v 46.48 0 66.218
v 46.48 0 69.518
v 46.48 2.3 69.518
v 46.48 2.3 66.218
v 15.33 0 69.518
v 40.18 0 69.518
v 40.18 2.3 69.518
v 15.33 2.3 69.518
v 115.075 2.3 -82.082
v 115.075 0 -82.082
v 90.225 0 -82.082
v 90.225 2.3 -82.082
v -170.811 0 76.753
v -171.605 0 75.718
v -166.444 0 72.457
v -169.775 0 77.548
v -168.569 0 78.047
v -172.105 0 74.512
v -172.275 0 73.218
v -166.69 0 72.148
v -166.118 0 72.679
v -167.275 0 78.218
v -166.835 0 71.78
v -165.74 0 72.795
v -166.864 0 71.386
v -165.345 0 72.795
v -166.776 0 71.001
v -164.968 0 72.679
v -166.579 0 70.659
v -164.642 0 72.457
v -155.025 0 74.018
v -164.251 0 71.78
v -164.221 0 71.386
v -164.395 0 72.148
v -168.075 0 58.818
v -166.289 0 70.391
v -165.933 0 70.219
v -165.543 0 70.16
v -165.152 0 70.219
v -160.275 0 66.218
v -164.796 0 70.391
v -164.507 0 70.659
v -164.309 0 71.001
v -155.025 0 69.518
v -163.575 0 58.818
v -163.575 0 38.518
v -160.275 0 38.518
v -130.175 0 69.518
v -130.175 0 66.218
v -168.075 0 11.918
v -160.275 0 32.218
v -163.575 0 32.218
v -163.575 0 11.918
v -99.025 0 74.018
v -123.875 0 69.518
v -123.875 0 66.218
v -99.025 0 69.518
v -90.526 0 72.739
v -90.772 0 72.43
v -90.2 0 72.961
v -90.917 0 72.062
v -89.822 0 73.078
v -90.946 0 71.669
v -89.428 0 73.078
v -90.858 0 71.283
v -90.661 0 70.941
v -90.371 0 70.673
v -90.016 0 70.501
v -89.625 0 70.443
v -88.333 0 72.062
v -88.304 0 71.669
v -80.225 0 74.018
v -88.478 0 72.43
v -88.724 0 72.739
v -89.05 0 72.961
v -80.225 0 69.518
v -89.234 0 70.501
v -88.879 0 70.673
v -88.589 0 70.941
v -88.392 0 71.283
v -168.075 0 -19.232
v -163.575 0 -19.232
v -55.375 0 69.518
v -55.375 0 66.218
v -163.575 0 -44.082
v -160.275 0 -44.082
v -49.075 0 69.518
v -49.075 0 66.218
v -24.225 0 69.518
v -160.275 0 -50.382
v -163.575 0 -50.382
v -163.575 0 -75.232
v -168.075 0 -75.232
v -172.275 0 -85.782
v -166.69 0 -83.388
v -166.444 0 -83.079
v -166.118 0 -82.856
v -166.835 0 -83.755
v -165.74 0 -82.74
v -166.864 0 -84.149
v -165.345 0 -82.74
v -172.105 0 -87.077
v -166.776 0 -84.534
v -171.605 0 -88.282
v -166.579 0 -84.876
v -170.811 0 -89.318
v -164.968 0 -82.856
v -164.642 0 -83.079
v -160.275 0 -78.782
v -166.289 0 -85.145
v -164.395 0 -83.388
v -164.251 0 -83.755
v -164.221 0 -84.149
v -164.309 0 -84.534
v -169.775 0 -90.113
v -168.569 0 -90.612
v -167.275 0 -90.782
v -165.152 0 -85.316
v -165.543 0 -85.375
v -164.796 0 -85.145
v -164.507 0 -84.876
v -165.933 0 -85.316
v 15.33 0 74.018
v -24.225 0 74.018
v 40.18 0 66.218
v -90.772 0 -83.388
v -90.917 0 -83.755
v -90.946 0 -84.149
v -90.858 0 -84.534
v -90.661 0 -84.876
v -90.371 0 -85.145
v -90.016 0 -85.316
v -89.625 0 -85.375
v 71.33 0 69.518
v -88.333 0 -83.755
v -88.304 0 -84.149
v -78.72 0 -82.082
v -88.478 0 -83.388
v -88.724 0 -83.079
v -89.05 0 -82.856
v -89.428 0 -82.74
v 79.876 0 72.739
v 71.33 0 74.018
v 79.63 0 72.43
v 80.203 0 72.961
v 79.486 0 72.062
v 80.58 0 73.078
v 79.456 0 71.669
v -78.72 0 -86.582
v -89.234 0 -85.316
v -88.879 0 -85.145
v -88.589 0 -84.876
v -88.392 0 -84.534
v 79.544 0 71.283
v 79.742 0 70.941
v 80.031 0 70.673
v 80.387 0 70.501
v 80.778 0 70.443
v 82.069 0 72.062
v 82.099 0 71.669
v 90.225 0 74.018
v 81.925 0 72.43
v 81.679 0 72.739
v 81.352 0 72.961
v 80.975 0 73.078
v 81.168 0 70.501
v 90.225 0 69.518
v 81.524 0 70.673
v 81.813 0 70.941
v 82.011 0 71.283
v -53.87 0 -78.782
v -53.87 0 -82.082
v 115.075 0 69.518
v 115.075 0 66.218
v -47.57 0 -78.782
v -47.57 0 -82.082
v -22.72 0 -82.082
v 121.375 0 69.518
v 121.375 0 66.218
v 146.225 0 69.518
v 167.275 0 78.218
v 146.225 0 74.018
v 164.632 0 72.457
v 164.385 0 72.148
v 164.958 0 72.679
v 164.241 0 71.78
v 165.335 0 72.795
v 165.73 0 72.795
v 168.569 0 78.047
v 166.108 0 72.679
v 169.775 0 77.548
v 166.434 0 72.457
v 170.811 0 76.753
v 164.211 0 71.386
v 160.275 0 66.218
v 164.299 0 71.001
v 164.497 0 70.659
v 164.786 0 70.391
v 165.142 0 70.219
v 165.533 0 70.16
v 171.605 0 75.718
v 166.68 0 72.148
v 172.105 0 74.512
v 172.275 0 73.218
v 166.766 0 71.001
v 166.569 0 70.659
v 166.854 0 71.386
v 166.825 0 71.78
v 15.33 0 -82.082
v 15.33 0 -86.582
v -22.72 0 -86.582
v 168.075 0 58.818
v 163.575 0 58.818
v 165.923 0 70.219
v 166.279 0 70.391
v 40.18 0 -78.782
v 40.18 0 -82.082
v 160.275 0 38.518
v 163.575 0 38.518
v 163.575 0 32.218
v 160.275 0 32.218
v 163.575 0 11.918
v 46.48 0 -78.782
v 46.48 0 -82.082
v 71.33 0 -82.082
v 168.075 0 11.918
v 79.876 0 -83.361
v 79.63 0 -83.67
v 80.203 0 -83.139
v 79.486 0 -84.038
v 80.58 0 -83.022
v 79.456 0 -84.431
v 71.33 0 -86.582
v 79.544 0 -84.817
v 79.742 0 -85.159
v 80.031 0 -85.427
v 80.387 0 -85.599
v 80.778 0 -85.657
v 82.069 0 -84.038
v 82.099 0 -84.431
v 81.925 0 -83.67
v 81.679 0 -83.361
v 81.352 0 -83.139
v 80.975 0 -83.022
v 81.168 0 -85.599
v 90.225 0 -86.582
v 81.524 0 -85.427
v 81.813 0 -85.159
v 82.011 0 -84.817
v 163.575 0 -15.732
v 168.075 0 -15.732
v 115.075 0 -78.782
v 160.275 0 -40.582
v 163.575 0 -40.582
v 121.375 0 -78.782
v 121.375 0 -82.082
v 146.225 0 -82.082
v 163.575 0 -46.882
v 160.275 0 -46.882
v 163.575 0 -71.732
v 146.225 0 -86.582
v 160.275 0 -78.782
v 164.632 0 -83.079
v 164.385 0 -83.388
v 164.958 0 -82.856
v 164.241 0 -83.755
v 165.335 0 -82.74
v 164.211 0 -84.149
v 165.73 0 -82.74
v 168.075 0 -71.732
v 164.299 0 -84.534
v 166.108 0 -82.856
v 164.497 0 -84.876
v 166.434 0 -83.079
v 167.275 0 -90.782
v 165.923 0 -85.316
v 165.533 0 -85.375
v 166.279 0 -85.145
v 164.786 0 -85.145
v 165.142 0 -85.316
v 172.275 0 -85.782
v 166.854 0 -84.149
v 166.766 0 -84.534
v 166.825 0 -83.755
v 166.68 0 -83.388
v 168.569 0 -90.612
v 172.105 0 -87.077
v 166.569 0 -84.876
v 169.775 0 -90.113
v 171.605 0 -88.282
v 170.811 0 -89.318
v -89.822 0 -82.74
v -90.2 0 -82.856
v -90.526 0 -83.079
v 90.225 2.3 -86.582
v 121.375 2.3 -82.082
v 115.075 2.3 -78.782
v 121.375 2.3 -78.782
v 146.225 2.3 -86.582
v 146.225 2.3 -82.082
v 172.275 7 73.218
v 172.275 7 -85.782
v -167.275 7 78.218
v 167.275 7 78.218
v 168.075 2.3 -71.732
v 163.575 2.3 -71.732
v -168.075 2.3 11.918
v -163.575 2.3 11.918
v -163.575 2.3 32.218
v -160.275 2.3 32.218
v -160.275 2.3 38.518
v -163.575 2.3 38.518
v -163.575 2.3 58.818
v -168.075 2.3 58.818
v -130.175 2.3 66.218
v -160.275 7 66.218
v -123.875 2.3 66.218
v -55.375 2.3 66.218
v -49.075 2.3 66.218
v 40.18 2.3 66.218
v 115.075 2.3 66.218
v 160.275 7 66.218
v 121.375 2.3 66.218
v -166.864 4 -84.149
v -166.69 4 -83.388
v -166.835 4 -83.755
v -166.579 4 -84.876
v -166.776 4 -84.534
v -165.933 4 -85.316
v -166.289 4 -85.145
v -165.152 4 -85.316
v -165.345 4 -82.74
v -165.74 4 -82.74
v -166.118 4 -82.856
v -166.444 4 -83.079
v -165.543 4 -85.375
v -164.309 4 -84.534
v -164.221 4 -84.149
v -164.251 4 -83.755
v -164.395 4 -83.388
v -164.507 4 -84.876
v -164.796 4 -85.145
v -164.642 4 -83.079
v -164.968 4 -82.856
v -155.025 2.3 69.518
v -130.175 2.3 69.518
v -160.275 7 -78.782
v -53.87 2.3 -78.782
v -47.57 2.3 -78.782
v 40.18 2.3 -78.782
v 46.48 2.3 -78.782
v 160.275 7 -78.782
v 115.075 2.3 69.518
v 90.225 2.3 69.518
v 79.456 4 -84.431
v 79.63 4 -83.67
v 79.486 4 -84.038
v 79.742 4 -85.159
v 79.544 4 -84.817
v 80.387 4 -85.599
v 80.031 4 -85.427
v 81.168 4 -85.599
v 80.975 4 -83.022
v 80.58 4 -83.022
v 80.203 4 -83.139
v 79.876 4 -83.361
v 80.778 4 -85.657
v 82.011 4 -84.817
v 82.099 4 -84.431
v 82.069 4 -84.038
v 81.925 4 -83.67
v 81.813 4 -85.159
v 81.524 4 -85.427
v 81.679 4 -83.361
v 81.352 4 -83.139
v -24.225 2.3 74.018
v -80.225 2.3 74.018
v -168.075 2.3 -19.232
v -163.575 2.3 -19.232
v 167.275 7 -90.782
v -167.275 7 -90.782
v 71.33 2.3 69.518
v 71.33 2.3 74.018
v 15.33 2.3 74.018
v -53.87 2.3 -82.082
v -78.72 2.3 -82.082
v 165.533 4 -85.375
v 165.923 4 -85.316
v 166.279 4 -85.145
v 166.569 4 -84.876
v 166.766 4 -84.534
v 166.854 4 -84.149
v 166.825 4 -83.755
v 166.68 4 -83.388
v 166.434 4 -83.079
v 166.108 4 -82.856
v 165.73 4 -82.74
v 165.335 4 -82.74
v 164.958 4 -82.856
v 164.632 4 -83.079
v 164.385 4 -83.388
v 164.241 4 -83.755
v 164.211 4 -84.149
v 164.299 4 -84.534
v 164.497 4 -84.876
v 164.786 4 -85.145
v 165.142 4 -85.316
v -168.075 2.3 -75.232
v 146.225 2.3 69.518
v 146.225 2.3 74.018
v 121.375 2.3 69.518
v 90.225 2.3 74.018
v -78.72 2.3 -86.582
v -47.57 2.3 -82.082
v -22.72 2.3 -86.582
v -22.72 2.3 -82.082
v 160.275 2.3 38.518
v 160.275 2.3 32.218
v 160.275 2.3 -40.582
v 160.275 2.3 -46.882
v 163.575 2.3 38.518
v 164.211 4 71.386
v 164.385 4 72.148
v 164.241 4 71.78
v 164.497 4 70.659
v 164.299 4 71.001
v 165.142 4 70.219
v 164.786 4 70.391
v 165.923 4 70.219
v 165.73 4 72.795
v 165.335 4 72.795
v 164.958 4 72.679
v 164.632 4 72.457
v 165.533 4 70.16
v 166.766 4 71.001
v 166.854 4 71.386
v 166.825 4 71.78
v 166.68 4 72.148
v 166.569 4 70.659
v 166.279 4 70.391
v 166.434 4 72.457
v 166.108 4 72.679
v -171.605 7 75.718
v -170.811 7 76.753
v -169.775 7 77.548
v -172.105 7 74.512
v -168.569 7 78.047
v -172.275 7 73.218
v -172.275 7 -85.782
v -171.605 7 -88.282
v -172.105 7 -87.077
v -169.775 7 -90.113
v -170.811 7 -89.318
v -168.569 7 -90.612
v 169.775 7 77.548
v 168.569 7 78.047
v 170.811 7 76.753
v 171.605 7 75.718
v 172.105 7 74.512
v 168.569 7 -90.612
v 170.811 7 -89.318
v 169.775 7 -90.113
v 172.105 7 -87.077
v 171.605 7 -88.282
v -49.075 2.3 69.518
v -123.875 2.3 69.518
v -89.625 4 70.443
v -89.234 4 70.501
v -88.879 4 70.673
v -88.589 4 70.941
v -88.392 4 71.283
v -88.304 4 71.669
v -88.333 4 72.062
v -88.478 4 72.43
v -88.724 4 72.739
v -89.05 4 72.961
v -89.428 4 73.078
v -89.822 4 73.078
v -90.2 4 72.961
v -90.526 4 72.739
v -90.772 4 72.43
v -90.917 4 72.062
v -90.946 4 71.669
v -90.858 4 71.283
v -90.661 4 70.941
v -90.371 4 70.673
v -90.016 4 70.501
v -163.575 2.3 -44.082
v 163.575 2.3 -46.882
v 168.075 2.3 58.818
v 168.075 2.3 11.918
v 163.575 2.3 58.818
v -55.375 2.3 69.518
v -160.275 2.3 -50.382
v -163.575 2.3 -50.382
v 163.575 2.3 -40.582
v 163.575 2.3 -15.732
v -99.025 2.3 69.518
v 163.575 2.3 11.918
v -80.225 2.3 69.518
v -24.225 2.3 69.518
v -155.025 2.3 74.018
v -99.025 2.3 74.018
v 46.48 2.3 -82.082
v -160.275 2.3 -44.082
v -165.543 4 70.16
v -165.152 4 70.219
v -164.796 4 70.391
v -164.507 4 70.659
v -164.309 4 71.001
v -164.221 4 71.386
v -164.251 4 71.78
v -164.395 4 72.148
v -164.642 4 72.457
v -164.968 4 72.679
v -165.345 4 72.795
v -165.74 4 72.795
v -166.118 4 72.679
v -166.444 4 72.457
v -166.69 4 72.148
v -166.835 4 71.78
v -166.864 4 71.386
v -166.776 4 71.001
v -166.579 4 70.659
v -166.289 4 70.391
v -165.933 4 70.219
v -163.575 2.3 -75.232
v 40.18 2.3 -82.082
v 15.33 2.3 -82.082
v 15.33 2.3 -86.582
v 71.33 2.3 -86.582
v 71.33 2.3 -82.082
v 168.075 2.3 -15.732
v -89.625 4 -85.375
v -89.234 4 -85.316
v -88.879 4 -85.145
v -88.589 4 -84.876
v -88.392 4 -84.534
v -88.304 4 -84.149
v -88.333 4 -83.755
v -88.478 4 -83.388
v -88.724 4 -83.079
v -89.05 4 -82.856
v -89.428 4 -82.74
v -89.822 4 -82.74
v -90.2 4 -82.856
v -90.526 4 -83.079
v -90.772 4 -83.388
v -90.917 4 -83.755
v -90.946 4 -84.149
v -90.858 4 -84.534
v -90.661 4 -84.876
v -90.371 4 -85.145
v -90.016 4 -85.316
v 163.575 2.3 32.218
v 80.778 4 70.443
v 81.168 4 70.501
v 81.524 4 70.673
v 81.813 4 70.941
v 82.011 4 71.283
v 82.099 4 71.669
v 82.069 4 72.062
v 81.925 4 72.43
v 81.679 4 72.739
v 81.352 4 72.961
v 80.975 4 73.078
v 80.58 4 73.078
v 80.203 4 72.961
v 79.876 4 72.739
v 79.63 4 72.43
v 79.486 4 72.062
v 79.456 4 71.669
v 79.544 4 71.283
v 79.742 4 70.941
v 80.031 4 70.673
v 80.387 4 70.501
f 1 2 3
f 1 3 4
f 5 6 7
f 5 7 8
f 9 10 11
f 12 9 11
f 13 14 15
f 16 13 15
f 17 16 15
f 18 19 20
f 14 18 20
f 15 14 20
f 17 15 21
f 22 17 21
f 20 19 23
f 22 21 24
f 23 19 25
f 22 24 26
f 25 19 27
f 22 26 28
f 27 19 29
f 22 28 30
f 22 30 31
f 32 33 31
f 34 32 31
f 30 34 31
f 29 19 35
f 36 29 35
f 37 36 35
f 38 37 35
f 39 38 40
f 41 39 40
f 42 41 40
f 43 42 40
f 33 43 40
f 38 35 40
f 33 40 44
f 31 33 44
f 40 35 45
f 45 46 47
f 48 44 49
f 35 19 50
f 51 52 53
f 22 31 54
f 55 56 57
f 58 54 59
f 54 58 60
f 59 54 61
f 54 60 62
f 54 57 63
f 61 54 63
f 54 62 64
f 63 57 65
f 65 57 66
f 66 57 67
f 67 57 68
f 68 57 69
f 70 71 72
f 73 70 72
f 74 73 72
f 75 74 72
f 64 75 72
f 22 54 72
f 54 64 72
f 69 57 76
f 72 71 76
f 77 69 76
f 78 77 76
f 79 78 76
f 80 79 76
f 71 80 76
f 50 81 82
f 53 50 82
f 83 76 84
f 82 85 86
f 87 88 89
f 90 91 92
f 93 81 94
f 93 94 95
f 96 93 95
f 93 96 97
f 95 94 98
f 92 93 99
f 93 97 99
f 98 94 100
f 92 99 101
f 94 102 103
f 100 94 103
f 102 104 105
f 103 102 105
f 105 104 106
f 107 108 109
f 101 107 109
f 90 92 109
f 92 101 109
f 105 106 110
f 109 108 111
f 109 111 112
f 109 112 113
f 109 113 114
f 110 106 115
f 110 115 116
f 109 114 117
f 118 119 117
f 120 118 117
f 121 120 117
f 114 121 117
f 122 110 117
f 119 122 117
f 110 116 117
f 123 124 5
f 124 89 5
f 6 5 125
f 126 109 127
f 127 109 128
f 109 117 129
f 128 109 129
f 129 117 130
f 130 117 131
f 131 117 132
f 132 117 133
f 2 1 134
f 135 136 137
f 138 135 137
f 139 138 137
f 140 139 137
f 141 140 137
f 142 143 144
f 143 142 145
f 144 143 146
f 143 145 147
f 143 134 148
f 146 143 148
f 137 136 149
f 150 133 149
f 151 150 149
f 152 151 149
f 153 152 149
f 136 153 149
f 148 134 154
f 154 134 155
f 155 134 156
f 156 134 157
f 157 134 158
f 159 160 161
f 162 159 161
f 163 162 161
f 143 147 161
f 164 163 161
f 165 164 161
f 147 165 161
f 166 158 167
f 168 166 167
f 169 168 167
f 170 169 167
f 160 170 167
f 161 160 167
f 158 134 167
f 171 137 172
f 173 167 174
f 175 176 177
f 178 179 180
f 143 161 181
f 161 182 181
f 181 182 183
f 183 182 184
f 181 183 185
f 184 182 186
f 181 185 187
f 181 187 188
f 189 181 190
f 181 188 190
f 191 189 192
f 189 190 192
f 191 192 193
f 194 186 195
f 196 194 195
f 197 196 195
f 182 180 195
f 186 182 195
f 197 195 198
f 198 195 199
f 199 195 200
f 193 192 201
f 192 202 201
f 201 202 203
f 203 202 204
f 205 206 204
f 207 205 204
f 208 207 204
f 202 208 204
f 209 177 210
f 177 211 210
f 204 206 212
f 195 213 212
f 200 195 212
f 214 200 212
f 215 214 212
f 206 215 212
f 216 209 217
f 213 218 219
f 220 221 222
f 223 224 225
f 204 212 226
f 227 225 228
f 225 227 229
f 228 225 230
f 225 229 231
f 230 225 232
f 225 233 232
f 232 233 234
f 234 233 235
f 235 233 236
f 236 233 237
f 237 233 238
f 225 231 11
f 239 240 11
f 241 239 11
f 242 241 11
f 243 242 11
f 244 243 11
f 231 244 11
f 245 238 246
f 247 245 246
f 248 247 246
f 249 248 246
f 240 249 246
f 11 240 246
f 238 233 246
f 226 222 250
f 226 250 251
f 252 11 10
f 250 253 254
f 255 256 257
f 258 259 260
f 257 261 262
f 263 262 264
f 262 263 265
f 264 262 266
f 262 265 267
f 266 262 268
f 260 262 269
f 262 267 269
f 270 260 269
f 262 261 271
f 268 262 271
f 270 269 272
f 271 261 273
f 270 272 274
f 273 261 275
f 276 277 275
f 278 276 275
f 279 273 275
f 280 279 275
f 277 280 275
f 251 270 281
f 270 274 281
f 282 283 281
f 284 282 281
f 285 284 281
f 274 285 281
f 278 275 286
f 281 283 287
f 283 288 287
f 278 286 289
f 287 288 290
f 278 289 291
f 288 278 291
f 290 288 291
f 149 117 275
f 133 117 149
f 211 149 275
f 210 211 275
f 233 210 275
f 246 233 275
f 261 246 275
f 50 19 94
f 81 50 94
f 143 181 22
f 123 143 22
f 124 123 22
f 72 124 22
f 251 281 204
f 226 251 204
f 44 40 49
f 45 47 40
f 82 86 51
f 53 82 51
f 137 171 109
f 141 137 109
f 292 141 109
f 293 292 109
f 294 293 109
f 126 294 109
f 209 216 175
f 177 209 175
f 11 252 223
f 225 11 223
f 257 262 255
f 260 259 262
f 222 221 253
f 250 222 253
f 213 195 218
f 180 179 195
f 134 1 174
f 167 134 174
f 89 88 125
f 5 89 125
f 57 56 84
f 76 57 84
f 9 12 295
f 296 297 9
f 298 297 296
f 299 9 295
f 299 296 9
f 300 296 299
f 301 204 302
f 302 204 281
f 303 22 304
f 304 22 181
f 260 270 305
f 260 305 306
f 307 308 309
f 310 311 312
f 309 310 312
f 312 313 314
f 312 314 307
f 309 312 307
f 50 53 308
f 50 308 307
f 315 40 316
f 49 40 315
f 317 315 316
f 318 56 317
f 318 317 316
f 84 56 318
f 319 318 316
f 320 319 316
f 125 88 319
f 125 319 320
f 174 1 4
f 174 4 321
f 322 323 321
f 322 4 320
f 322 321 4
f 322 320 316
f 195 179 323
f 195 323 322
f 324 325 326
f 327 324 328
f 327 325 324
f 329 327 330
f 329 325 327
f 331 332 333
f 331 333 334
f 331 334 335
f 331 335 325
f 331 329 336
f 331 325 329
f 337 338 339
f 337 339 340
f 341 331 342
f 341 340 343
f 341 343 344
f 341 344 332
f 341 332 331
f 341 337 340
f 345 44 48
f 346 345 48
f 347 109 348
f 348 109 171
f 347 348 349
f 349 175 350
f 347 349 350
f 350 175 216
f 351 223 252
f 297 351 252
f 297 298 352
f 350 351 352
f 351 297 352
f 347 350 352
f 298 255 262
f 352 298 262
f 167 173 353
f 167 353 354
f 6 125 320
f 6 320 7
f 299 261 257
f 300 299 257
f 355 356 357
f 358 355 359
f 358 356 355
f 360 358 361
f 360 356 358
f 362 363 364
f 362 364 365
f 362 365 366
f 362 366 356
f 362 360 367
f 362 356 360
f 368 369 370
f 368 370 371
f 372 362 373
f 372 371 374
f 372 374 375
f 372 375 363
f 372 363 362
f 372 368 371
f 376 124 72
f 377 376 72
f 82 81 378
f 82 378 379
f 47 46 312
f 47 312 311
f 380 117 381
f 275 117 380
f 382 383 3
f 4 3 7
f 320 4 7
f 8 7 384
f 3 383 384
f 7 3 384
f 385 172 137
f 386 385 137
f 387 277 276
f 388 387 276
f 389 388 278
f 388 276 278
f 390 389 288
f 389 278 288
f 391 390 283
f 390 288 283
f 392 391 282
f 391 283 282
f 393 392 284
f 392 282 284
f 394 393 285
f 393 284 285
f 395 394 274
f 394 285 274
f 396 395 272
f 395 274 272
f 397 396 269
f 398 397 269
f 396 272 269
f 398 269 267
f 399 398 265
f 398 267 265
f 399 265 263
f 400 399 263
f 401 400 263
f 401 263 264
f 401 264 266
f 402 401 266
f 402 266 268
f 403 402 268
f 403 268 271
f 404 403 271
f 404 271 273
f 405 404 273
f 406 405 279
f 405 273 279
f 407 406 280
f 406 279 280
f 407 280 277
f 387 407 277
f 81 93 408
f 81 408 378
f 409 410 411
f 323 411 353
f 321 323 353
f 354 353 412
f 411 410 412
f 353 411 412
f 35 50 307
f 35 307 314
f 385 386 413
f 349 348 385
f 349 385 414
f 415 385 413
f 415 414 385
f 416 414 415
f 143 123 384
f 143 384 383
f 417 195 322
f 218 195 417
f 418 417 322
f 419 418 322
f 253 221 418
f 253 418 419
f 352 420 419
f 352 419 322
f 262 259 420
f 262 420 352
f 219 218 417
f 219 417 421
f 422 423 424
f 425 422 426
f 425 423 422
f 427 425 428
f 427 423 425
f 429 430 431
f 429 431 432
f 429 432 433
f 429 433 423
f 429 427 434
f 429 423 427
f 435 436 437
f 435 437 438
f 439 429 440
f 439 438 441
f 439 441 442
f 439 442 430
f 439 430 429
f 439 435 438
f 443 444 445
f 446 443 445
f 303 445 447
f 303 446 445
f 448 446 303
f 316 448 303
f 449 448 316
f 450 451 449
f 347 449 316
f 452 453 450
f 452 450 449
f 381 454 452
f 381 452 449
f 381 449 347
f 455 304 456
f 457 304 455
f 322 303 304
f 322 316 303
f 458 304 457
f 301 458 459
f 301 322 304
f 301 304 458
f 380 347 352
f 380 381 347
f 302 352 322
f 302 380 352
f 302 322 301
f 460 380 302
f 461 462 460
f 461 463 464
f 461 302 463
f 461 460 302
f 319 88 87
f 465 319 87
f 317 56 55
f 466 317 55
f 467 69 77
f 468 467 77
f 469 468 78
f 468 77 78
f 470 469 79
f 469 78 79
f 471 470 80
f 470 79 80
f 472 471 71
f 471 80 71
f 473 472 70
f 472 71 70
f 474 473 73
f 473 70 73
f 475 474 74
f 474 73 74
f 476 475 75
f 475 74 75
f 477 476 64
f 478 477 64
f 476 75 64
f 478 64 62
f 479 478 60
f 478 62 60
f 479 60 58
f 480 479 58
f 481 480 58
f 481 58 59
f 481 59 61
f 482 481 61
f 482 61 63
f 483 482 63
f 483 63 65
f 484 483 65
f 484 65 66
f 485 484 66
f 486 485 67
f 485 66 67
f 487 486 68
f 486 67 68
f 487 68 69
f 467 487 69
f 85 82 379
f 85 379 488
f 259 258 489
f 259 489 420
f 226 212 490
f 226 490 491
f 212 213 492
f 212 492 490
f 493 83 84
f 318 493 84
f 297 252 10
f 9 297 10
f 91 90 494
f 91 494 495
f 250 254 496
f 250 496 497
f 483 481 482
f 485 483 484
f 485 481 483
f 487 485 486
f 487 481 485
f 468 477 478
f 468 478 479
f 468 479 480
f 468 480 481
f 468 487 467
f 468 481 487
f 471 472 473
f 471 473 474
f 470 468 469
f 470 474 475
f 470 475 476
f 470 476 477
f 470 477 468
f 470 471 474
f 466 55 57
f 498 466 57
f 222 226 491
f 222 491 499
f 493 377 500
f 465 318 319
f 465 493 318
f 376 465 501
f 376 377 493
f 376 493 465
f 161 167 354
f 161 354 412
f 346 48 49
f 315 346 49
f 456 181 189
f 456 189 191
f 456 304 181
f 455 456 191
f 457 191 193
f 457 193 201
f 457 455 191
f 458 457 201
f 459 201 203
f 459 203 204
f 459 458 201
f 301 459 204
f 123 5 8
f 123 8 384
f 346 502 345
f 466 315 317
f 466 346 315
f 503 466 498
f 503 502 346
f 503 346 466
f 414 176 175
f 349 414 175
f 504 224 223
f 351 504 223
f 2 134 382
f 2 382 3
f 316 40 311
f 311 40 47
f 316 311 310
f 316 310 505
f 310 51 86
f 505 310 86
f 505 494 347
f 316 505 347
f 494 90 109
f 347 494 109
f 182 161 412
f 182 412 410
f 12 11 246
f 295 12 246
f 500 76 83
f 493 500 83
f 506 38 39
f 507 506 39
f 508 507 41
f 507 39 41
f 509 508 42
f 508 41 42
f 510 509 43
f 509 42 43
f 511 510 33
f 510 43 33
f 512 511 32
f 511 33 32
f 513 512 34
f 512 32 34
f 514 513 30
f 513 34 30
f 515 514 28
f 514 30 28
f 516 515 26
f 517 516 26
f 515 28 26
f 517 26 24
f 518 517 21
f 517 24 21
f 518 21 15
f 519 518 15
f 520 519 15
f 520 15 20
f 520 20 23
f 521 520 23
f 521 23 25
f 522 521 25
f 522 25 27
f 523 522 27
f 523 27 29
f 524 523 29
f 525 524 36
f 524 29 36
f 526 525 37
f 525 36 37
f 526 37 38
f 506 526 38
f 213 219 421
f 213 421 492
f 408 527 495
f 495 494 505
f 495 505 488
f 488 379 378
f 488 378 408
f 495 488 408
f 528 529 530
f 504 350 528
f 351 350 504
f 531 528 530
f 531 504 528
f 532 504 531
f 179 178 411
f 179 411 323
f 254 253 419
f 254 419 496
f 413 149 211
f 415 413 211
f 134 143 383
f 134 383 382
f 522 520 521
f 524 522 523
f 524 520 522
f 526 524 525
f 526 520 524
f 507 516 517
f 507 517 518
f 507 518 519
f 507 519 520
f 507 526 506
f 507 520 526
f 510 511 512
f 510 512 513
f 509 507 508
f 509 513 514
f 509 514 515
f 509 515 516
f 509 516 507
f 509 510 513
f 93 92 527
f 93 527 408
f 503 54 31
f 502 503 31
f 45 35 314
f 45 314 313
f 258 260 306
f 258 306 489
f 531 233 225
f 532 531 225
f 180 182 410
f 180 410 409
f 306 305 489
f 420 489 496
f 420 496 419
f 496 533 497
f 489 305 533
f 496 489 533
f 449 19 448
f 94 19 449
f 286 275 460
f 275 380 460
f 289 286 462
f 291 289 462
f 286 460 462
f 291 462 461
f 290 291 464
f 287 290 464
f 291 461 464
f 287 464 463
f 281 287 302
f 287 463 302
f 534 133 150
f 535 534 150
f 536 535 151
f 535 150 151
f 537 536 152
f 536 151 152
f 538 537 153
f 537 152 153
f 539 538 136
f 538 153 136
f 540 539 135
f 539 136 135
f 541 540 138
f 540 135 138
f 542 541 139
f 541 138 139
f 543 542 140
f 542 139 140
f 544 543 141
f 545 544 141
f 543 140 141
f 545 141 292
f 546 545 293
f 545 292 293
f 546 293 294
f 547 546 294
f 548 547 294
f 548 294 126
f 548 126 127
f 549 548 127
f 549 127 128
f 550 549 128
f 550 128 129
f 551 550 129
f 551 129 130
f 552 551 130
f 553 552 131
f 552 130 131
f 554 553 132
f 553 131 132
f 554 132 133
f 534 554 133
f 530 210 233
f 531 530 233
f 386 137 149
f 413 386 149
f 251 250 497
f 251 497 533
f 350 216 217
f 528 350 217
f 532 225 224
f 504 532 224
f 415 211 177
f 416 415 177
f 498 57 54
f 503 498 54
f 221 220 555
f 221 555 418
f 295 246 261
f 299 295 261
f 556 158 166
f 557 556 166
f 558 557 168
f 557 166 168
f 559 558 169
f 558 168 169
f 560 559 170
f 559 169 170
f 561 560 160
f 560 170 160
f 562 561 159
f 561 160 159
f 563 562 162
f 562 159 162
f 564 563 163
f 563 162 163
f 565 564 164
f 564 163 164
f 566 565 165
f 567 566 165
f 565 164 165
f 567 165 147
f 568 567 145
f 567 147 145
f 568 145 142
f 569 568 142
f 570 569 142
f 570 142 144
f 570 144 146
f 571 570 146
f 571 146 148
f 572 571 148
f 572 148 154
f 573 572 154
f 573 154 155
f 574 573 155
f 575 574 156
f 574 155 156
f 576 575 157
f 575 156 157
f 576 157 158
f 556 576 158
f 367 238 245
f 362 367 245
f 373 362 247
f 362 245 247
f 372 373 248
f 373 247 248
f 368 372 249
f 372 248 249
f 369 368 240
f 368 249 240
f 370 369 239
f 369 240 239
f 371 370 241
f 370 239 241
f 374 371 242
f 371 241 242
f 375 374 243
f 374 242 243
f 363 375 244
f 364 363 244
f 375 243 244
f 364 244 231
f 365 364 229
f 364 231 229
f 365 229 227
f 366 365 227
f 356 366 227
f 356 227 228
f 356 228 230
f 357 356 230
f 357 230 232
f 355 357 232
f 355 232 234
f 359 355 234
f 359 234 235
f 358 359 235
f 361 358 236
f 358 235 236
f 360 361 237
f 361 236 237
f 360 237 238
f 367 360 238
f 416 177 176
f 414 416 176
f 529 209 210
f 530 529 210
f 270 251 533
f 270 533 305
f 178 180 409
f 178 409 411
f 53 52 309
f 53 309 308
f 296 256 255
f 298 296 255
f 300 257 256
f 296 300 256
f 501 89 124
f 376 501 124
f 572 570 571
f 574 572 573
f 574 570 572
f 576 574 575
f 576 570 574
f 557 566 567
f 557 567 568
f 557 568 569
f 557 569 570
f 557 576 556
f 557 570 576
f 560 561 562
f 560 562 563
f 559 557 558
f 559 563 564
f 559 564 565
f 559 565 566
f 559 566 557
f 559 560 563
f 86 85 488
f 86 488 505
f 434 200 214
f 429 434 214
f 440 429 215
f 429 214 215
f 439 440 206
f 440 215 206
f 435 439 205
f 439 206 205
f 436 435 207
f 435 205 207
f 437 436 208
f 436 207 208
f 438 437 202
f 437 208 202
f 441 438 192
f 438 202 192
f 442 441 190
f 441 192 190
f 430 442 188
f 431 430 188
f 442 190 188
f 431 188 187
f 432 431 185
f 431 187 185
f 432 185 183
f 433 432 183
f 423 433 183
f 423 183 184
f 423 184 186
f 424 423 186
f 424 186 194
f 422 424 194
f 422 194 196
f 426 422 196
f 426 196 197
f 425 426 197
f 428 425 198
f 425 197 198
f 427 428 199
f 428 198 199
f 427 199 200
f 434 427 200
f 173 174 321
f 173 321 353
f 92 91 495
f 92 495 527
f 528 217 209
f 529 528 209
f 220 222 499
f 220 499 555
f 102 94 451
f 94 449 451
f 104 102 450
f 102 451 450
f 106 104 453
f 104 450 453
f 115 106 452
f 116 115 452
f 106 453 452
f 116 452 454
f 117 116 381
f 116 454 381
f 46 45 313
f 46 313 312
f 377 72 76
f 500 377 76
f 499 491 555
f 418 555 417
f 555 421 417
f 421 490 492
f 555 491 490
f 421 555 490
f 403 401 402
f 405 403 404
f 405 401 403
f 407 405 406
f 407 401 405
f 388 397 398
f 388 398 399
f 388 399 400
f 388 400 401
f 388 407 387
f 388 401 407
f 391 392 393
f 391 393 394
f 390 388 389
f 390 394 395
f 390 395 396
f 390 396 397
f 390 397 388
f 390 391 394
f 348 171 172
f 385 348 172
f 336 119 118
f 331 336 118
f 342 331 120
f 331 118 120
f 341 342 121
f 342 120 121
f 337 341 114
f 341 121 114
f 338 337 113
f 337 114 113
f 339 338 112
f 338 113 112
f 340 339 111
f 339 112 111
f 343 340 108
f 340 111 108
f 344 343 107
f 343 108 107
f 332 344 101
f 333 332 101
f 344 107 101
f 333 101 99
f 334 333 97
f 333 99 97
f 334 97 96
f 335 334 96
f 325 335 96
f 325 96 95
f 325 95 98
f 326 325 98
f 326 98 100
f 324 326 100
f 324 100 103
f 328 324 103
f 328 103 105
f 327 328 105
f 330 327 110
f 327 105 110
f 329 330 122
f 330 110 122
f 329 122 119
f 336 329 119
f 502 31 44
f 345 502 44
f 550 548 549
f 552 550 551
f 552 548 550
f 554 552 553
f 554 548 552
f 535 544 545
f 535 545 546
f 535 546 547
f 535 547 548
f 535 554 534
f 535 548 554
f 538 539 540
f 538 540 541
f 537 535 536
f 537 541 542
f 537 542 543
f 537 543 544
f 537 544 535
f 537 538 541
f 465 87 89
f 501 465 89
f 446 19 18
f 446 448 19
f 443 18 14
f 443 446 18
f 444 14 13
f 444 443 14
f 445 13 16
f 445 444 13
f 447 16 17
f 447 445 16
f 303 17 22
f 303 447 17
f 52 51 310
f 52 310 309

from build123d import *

# Parameters (mm, degrees)
SKETCH1_W           = 344.55
SKETCH1_H           = 169
SKETCH1_W_2         = 320.55
SKETCH1_H_2         = 145
BOSS_EXTRUDE1_DEPTH = 7
FILLET1_R           = 5
FILLET2_R           = 5
FILLET3_R           = 5
CUT_EXTRUDE2_DEPTH  = 2.3
FILLET5_R           = 5
SKETCH4_R           = 1.325
CUT_EXTRUDE3_DEPTH  = 4


with BuildPart() as part:
    # Sketch1 → Boss-Extrude1 (new body)
    with BuildSketch(Plane(origin=(0, 0, 0), x_dir=(1, 0, 0), z_dir=(0, 1, 0))):
        with Locations((0, 6.282475928)):
            Rectangle(SKETCH1_W, SKETCH1_H)
        with Locations((0, 6.282475928)):
            Rectangle(SKETCH1_W_2, SKETCH1_H_2, mode=Mode.SUBTRACT)
    extrude(amount=BOSS_EXTRUDE1_DEPTH)

    # Fillet1
    fillet1_edges = [part.edges().sort_by_distance(p)[0] for p in [
        (172.275, 3.5, 78.217524072),
    ]]
    fillet(fillet1_edges, radius=FILLET1_R)

    # Fillet2
    fillet2_edges = [part.edges().sort_by_distance(p)[0] for p in [
        (-172.275, 3.5, -90.782475928),
    ]]
    fillet(fillet2_edges, radius=FILLET2_R)

    # Fillet3
    fillet3_edges = [part.edges().sort_by_distance(p)[0] for p in [
        (-172.275, 3.5, 78.217524072),
    ]]
    fillet(fillet3_edges, radius=FILLET3_R)

    # Sketch3 → Cut-Extrude2 (cut)
    with BuildSketch(Plane.XZ):
        Polygon((-22.72, -82.082475928), (-47.57, -82.082475928), (-47.57, -78.782475928), (-53.87, -78.782475928), (-53.87, -82.082475928), (-78.72, -82.082475928), (-78.72, -86.582475928), (-22.72, -86.582475928), align=None)
        Polygon((-130.175, 66.217524072), (-123.875, 66.217524072), (-123.875, 69.517524072), (-99.025, 69.517524072), (-99.025, 74.017524072), (-155.025, 74.017524072), (-155.025, 69.517524072), (-130.175, 69.517524072), align=None)
        Polygon((146.225, -82.082475928), (121.375, -82.082475928), (121.375, -78.782475928), (115.075, -78.782475928), (115.075, -82.082475928), (90.225, -82.082475928), (90.225, -86.582475928), (146.225, -86.582475928), align=None)
        Polygon((71.33, -86.582475928), (71.33, -82.082475928), (46.48, -82.082475928), (46.48, -78.782475928), (40.18, -78.782475928), (40.18, -82.082475928), (15.33, -82.082475928), (15.33, -86.582475928), align=None)
        Polygon((-160.275, -44.082475928), (-160.275, -50.382475928), (-163.575, -50.382475928), (-163.575, -75.232475928), (-168.075, -75.232475928), (-168.075, -19.232475928), (-163.575, -19.232475928), (-163.575, -44.082475928), align=None)
        Polygon((163.575, 11.917524072), (163.575, 32.217524072), (160.275, 32.217524072), (160.275, 38.517524072), (163.575, 38.517524072), (163.575, 58.817524072), (168.075, 58.817524072), (168.075, 11.917524072), align=None)
        Polygon((160.275, -40.582475928), (163.575, -40.582475928), (163.575, -15.732475928), (168.075, -15.732475928), (168.075, -71.732475928), (163.575, -71.732475928), (163.575, -46.882475928), (160.275, -46.882475928), align=None)
        Polygon((146.225, 74.017524072), (146.225, 69.517524072), (121.375, 69.517524072), (121.375, 66.217524072), (115.075, 66.217524072), (115.075, 69.517524072), (90.225, 69.517524072), (90.225, 74.017524072), align=None)
        Polygon((15.33, 74.017524072), (71.33, 74.017524072), (71.33, 69.517524072), (46.48, 69.517524072), (46.48, 66.217524072), (40.18, 66.217524072), (40.18, 69.517524072), (15.33, 69.517524072), align=None)
        Polygon((-160.275, 38.517524072), (-160.275, 32.217524072), (-163.575, 32.217524072), (-163.575, 11.917524072), (-168.075, 11.917524072), (-168.075, 58.817524072), (-163.575, 58.817524072), (-163.575, 38.517524072), align=None)
        Polygon((-55.375, 66.217524072), (-49.075, 66.217524072), (-49.075, 69.517524072), (-24.225, 69.517524072), (-24.225, 74.017524072), (-80.225, 74.017524072), (-80.225, 69.517524072), (-55.375, 69.517524072), align=None)
    extrude(amount=-CUT_EXTRUDE2_DEPTH, mode=Mode.SUBTRACT)

    # Fillet5
    fillet5_edges = [part.edges().sort_by_distance(p)[0] for p in [
        (172.275, 3.5, -90.782475928),
    ]]
    fillet(fillet5_edges, radius=FILLET5_R)

    # Sketch4 → Cut-Extrude3 (cut)
    with BuildSketch(Plane.XZ):
        with Locations(Location((-165.542766953, 71.485291024, 0), (0, 0, 270))):
            Circle(SKETCH4_R)
        with Locations(Location((-89.625, 71.767524072, 0), (0, 0, 270))):
            Circle(SKETCH4_R)
        with Locations(Location((80.7775, 71.767524072, 0), (0, 0, 270))):
            Circle(SKETCH4_R)
        with Locations(Location((165.532766953, 71.485291024, 0), (0, 0, 270))):
            Circle(SKETCH4_R)
        with Locations(Location((165.532766953, -84.050242881, 0), (0, 0, 270))):
            Circle(SKETCH4_R)
        with Locations(Location((80.7775, -84.332475928, 0), (0, 0, 270))):
            Circle(SKETCH4_R)
        with Locations(Location((-89.625, -84.050242881, 0), (0, 0, 270))):
            Circle(SKETCH4_R)
        with Locations(Location((-165.542766953, -84.050242881, 0), (0, 0, 270))):
            Circle(SKETCH4_R)
    extrude(amount=-CUT_EXTRUDE3_DEPTH, mode=Mode.SUBTRACT)


solid = part.part
